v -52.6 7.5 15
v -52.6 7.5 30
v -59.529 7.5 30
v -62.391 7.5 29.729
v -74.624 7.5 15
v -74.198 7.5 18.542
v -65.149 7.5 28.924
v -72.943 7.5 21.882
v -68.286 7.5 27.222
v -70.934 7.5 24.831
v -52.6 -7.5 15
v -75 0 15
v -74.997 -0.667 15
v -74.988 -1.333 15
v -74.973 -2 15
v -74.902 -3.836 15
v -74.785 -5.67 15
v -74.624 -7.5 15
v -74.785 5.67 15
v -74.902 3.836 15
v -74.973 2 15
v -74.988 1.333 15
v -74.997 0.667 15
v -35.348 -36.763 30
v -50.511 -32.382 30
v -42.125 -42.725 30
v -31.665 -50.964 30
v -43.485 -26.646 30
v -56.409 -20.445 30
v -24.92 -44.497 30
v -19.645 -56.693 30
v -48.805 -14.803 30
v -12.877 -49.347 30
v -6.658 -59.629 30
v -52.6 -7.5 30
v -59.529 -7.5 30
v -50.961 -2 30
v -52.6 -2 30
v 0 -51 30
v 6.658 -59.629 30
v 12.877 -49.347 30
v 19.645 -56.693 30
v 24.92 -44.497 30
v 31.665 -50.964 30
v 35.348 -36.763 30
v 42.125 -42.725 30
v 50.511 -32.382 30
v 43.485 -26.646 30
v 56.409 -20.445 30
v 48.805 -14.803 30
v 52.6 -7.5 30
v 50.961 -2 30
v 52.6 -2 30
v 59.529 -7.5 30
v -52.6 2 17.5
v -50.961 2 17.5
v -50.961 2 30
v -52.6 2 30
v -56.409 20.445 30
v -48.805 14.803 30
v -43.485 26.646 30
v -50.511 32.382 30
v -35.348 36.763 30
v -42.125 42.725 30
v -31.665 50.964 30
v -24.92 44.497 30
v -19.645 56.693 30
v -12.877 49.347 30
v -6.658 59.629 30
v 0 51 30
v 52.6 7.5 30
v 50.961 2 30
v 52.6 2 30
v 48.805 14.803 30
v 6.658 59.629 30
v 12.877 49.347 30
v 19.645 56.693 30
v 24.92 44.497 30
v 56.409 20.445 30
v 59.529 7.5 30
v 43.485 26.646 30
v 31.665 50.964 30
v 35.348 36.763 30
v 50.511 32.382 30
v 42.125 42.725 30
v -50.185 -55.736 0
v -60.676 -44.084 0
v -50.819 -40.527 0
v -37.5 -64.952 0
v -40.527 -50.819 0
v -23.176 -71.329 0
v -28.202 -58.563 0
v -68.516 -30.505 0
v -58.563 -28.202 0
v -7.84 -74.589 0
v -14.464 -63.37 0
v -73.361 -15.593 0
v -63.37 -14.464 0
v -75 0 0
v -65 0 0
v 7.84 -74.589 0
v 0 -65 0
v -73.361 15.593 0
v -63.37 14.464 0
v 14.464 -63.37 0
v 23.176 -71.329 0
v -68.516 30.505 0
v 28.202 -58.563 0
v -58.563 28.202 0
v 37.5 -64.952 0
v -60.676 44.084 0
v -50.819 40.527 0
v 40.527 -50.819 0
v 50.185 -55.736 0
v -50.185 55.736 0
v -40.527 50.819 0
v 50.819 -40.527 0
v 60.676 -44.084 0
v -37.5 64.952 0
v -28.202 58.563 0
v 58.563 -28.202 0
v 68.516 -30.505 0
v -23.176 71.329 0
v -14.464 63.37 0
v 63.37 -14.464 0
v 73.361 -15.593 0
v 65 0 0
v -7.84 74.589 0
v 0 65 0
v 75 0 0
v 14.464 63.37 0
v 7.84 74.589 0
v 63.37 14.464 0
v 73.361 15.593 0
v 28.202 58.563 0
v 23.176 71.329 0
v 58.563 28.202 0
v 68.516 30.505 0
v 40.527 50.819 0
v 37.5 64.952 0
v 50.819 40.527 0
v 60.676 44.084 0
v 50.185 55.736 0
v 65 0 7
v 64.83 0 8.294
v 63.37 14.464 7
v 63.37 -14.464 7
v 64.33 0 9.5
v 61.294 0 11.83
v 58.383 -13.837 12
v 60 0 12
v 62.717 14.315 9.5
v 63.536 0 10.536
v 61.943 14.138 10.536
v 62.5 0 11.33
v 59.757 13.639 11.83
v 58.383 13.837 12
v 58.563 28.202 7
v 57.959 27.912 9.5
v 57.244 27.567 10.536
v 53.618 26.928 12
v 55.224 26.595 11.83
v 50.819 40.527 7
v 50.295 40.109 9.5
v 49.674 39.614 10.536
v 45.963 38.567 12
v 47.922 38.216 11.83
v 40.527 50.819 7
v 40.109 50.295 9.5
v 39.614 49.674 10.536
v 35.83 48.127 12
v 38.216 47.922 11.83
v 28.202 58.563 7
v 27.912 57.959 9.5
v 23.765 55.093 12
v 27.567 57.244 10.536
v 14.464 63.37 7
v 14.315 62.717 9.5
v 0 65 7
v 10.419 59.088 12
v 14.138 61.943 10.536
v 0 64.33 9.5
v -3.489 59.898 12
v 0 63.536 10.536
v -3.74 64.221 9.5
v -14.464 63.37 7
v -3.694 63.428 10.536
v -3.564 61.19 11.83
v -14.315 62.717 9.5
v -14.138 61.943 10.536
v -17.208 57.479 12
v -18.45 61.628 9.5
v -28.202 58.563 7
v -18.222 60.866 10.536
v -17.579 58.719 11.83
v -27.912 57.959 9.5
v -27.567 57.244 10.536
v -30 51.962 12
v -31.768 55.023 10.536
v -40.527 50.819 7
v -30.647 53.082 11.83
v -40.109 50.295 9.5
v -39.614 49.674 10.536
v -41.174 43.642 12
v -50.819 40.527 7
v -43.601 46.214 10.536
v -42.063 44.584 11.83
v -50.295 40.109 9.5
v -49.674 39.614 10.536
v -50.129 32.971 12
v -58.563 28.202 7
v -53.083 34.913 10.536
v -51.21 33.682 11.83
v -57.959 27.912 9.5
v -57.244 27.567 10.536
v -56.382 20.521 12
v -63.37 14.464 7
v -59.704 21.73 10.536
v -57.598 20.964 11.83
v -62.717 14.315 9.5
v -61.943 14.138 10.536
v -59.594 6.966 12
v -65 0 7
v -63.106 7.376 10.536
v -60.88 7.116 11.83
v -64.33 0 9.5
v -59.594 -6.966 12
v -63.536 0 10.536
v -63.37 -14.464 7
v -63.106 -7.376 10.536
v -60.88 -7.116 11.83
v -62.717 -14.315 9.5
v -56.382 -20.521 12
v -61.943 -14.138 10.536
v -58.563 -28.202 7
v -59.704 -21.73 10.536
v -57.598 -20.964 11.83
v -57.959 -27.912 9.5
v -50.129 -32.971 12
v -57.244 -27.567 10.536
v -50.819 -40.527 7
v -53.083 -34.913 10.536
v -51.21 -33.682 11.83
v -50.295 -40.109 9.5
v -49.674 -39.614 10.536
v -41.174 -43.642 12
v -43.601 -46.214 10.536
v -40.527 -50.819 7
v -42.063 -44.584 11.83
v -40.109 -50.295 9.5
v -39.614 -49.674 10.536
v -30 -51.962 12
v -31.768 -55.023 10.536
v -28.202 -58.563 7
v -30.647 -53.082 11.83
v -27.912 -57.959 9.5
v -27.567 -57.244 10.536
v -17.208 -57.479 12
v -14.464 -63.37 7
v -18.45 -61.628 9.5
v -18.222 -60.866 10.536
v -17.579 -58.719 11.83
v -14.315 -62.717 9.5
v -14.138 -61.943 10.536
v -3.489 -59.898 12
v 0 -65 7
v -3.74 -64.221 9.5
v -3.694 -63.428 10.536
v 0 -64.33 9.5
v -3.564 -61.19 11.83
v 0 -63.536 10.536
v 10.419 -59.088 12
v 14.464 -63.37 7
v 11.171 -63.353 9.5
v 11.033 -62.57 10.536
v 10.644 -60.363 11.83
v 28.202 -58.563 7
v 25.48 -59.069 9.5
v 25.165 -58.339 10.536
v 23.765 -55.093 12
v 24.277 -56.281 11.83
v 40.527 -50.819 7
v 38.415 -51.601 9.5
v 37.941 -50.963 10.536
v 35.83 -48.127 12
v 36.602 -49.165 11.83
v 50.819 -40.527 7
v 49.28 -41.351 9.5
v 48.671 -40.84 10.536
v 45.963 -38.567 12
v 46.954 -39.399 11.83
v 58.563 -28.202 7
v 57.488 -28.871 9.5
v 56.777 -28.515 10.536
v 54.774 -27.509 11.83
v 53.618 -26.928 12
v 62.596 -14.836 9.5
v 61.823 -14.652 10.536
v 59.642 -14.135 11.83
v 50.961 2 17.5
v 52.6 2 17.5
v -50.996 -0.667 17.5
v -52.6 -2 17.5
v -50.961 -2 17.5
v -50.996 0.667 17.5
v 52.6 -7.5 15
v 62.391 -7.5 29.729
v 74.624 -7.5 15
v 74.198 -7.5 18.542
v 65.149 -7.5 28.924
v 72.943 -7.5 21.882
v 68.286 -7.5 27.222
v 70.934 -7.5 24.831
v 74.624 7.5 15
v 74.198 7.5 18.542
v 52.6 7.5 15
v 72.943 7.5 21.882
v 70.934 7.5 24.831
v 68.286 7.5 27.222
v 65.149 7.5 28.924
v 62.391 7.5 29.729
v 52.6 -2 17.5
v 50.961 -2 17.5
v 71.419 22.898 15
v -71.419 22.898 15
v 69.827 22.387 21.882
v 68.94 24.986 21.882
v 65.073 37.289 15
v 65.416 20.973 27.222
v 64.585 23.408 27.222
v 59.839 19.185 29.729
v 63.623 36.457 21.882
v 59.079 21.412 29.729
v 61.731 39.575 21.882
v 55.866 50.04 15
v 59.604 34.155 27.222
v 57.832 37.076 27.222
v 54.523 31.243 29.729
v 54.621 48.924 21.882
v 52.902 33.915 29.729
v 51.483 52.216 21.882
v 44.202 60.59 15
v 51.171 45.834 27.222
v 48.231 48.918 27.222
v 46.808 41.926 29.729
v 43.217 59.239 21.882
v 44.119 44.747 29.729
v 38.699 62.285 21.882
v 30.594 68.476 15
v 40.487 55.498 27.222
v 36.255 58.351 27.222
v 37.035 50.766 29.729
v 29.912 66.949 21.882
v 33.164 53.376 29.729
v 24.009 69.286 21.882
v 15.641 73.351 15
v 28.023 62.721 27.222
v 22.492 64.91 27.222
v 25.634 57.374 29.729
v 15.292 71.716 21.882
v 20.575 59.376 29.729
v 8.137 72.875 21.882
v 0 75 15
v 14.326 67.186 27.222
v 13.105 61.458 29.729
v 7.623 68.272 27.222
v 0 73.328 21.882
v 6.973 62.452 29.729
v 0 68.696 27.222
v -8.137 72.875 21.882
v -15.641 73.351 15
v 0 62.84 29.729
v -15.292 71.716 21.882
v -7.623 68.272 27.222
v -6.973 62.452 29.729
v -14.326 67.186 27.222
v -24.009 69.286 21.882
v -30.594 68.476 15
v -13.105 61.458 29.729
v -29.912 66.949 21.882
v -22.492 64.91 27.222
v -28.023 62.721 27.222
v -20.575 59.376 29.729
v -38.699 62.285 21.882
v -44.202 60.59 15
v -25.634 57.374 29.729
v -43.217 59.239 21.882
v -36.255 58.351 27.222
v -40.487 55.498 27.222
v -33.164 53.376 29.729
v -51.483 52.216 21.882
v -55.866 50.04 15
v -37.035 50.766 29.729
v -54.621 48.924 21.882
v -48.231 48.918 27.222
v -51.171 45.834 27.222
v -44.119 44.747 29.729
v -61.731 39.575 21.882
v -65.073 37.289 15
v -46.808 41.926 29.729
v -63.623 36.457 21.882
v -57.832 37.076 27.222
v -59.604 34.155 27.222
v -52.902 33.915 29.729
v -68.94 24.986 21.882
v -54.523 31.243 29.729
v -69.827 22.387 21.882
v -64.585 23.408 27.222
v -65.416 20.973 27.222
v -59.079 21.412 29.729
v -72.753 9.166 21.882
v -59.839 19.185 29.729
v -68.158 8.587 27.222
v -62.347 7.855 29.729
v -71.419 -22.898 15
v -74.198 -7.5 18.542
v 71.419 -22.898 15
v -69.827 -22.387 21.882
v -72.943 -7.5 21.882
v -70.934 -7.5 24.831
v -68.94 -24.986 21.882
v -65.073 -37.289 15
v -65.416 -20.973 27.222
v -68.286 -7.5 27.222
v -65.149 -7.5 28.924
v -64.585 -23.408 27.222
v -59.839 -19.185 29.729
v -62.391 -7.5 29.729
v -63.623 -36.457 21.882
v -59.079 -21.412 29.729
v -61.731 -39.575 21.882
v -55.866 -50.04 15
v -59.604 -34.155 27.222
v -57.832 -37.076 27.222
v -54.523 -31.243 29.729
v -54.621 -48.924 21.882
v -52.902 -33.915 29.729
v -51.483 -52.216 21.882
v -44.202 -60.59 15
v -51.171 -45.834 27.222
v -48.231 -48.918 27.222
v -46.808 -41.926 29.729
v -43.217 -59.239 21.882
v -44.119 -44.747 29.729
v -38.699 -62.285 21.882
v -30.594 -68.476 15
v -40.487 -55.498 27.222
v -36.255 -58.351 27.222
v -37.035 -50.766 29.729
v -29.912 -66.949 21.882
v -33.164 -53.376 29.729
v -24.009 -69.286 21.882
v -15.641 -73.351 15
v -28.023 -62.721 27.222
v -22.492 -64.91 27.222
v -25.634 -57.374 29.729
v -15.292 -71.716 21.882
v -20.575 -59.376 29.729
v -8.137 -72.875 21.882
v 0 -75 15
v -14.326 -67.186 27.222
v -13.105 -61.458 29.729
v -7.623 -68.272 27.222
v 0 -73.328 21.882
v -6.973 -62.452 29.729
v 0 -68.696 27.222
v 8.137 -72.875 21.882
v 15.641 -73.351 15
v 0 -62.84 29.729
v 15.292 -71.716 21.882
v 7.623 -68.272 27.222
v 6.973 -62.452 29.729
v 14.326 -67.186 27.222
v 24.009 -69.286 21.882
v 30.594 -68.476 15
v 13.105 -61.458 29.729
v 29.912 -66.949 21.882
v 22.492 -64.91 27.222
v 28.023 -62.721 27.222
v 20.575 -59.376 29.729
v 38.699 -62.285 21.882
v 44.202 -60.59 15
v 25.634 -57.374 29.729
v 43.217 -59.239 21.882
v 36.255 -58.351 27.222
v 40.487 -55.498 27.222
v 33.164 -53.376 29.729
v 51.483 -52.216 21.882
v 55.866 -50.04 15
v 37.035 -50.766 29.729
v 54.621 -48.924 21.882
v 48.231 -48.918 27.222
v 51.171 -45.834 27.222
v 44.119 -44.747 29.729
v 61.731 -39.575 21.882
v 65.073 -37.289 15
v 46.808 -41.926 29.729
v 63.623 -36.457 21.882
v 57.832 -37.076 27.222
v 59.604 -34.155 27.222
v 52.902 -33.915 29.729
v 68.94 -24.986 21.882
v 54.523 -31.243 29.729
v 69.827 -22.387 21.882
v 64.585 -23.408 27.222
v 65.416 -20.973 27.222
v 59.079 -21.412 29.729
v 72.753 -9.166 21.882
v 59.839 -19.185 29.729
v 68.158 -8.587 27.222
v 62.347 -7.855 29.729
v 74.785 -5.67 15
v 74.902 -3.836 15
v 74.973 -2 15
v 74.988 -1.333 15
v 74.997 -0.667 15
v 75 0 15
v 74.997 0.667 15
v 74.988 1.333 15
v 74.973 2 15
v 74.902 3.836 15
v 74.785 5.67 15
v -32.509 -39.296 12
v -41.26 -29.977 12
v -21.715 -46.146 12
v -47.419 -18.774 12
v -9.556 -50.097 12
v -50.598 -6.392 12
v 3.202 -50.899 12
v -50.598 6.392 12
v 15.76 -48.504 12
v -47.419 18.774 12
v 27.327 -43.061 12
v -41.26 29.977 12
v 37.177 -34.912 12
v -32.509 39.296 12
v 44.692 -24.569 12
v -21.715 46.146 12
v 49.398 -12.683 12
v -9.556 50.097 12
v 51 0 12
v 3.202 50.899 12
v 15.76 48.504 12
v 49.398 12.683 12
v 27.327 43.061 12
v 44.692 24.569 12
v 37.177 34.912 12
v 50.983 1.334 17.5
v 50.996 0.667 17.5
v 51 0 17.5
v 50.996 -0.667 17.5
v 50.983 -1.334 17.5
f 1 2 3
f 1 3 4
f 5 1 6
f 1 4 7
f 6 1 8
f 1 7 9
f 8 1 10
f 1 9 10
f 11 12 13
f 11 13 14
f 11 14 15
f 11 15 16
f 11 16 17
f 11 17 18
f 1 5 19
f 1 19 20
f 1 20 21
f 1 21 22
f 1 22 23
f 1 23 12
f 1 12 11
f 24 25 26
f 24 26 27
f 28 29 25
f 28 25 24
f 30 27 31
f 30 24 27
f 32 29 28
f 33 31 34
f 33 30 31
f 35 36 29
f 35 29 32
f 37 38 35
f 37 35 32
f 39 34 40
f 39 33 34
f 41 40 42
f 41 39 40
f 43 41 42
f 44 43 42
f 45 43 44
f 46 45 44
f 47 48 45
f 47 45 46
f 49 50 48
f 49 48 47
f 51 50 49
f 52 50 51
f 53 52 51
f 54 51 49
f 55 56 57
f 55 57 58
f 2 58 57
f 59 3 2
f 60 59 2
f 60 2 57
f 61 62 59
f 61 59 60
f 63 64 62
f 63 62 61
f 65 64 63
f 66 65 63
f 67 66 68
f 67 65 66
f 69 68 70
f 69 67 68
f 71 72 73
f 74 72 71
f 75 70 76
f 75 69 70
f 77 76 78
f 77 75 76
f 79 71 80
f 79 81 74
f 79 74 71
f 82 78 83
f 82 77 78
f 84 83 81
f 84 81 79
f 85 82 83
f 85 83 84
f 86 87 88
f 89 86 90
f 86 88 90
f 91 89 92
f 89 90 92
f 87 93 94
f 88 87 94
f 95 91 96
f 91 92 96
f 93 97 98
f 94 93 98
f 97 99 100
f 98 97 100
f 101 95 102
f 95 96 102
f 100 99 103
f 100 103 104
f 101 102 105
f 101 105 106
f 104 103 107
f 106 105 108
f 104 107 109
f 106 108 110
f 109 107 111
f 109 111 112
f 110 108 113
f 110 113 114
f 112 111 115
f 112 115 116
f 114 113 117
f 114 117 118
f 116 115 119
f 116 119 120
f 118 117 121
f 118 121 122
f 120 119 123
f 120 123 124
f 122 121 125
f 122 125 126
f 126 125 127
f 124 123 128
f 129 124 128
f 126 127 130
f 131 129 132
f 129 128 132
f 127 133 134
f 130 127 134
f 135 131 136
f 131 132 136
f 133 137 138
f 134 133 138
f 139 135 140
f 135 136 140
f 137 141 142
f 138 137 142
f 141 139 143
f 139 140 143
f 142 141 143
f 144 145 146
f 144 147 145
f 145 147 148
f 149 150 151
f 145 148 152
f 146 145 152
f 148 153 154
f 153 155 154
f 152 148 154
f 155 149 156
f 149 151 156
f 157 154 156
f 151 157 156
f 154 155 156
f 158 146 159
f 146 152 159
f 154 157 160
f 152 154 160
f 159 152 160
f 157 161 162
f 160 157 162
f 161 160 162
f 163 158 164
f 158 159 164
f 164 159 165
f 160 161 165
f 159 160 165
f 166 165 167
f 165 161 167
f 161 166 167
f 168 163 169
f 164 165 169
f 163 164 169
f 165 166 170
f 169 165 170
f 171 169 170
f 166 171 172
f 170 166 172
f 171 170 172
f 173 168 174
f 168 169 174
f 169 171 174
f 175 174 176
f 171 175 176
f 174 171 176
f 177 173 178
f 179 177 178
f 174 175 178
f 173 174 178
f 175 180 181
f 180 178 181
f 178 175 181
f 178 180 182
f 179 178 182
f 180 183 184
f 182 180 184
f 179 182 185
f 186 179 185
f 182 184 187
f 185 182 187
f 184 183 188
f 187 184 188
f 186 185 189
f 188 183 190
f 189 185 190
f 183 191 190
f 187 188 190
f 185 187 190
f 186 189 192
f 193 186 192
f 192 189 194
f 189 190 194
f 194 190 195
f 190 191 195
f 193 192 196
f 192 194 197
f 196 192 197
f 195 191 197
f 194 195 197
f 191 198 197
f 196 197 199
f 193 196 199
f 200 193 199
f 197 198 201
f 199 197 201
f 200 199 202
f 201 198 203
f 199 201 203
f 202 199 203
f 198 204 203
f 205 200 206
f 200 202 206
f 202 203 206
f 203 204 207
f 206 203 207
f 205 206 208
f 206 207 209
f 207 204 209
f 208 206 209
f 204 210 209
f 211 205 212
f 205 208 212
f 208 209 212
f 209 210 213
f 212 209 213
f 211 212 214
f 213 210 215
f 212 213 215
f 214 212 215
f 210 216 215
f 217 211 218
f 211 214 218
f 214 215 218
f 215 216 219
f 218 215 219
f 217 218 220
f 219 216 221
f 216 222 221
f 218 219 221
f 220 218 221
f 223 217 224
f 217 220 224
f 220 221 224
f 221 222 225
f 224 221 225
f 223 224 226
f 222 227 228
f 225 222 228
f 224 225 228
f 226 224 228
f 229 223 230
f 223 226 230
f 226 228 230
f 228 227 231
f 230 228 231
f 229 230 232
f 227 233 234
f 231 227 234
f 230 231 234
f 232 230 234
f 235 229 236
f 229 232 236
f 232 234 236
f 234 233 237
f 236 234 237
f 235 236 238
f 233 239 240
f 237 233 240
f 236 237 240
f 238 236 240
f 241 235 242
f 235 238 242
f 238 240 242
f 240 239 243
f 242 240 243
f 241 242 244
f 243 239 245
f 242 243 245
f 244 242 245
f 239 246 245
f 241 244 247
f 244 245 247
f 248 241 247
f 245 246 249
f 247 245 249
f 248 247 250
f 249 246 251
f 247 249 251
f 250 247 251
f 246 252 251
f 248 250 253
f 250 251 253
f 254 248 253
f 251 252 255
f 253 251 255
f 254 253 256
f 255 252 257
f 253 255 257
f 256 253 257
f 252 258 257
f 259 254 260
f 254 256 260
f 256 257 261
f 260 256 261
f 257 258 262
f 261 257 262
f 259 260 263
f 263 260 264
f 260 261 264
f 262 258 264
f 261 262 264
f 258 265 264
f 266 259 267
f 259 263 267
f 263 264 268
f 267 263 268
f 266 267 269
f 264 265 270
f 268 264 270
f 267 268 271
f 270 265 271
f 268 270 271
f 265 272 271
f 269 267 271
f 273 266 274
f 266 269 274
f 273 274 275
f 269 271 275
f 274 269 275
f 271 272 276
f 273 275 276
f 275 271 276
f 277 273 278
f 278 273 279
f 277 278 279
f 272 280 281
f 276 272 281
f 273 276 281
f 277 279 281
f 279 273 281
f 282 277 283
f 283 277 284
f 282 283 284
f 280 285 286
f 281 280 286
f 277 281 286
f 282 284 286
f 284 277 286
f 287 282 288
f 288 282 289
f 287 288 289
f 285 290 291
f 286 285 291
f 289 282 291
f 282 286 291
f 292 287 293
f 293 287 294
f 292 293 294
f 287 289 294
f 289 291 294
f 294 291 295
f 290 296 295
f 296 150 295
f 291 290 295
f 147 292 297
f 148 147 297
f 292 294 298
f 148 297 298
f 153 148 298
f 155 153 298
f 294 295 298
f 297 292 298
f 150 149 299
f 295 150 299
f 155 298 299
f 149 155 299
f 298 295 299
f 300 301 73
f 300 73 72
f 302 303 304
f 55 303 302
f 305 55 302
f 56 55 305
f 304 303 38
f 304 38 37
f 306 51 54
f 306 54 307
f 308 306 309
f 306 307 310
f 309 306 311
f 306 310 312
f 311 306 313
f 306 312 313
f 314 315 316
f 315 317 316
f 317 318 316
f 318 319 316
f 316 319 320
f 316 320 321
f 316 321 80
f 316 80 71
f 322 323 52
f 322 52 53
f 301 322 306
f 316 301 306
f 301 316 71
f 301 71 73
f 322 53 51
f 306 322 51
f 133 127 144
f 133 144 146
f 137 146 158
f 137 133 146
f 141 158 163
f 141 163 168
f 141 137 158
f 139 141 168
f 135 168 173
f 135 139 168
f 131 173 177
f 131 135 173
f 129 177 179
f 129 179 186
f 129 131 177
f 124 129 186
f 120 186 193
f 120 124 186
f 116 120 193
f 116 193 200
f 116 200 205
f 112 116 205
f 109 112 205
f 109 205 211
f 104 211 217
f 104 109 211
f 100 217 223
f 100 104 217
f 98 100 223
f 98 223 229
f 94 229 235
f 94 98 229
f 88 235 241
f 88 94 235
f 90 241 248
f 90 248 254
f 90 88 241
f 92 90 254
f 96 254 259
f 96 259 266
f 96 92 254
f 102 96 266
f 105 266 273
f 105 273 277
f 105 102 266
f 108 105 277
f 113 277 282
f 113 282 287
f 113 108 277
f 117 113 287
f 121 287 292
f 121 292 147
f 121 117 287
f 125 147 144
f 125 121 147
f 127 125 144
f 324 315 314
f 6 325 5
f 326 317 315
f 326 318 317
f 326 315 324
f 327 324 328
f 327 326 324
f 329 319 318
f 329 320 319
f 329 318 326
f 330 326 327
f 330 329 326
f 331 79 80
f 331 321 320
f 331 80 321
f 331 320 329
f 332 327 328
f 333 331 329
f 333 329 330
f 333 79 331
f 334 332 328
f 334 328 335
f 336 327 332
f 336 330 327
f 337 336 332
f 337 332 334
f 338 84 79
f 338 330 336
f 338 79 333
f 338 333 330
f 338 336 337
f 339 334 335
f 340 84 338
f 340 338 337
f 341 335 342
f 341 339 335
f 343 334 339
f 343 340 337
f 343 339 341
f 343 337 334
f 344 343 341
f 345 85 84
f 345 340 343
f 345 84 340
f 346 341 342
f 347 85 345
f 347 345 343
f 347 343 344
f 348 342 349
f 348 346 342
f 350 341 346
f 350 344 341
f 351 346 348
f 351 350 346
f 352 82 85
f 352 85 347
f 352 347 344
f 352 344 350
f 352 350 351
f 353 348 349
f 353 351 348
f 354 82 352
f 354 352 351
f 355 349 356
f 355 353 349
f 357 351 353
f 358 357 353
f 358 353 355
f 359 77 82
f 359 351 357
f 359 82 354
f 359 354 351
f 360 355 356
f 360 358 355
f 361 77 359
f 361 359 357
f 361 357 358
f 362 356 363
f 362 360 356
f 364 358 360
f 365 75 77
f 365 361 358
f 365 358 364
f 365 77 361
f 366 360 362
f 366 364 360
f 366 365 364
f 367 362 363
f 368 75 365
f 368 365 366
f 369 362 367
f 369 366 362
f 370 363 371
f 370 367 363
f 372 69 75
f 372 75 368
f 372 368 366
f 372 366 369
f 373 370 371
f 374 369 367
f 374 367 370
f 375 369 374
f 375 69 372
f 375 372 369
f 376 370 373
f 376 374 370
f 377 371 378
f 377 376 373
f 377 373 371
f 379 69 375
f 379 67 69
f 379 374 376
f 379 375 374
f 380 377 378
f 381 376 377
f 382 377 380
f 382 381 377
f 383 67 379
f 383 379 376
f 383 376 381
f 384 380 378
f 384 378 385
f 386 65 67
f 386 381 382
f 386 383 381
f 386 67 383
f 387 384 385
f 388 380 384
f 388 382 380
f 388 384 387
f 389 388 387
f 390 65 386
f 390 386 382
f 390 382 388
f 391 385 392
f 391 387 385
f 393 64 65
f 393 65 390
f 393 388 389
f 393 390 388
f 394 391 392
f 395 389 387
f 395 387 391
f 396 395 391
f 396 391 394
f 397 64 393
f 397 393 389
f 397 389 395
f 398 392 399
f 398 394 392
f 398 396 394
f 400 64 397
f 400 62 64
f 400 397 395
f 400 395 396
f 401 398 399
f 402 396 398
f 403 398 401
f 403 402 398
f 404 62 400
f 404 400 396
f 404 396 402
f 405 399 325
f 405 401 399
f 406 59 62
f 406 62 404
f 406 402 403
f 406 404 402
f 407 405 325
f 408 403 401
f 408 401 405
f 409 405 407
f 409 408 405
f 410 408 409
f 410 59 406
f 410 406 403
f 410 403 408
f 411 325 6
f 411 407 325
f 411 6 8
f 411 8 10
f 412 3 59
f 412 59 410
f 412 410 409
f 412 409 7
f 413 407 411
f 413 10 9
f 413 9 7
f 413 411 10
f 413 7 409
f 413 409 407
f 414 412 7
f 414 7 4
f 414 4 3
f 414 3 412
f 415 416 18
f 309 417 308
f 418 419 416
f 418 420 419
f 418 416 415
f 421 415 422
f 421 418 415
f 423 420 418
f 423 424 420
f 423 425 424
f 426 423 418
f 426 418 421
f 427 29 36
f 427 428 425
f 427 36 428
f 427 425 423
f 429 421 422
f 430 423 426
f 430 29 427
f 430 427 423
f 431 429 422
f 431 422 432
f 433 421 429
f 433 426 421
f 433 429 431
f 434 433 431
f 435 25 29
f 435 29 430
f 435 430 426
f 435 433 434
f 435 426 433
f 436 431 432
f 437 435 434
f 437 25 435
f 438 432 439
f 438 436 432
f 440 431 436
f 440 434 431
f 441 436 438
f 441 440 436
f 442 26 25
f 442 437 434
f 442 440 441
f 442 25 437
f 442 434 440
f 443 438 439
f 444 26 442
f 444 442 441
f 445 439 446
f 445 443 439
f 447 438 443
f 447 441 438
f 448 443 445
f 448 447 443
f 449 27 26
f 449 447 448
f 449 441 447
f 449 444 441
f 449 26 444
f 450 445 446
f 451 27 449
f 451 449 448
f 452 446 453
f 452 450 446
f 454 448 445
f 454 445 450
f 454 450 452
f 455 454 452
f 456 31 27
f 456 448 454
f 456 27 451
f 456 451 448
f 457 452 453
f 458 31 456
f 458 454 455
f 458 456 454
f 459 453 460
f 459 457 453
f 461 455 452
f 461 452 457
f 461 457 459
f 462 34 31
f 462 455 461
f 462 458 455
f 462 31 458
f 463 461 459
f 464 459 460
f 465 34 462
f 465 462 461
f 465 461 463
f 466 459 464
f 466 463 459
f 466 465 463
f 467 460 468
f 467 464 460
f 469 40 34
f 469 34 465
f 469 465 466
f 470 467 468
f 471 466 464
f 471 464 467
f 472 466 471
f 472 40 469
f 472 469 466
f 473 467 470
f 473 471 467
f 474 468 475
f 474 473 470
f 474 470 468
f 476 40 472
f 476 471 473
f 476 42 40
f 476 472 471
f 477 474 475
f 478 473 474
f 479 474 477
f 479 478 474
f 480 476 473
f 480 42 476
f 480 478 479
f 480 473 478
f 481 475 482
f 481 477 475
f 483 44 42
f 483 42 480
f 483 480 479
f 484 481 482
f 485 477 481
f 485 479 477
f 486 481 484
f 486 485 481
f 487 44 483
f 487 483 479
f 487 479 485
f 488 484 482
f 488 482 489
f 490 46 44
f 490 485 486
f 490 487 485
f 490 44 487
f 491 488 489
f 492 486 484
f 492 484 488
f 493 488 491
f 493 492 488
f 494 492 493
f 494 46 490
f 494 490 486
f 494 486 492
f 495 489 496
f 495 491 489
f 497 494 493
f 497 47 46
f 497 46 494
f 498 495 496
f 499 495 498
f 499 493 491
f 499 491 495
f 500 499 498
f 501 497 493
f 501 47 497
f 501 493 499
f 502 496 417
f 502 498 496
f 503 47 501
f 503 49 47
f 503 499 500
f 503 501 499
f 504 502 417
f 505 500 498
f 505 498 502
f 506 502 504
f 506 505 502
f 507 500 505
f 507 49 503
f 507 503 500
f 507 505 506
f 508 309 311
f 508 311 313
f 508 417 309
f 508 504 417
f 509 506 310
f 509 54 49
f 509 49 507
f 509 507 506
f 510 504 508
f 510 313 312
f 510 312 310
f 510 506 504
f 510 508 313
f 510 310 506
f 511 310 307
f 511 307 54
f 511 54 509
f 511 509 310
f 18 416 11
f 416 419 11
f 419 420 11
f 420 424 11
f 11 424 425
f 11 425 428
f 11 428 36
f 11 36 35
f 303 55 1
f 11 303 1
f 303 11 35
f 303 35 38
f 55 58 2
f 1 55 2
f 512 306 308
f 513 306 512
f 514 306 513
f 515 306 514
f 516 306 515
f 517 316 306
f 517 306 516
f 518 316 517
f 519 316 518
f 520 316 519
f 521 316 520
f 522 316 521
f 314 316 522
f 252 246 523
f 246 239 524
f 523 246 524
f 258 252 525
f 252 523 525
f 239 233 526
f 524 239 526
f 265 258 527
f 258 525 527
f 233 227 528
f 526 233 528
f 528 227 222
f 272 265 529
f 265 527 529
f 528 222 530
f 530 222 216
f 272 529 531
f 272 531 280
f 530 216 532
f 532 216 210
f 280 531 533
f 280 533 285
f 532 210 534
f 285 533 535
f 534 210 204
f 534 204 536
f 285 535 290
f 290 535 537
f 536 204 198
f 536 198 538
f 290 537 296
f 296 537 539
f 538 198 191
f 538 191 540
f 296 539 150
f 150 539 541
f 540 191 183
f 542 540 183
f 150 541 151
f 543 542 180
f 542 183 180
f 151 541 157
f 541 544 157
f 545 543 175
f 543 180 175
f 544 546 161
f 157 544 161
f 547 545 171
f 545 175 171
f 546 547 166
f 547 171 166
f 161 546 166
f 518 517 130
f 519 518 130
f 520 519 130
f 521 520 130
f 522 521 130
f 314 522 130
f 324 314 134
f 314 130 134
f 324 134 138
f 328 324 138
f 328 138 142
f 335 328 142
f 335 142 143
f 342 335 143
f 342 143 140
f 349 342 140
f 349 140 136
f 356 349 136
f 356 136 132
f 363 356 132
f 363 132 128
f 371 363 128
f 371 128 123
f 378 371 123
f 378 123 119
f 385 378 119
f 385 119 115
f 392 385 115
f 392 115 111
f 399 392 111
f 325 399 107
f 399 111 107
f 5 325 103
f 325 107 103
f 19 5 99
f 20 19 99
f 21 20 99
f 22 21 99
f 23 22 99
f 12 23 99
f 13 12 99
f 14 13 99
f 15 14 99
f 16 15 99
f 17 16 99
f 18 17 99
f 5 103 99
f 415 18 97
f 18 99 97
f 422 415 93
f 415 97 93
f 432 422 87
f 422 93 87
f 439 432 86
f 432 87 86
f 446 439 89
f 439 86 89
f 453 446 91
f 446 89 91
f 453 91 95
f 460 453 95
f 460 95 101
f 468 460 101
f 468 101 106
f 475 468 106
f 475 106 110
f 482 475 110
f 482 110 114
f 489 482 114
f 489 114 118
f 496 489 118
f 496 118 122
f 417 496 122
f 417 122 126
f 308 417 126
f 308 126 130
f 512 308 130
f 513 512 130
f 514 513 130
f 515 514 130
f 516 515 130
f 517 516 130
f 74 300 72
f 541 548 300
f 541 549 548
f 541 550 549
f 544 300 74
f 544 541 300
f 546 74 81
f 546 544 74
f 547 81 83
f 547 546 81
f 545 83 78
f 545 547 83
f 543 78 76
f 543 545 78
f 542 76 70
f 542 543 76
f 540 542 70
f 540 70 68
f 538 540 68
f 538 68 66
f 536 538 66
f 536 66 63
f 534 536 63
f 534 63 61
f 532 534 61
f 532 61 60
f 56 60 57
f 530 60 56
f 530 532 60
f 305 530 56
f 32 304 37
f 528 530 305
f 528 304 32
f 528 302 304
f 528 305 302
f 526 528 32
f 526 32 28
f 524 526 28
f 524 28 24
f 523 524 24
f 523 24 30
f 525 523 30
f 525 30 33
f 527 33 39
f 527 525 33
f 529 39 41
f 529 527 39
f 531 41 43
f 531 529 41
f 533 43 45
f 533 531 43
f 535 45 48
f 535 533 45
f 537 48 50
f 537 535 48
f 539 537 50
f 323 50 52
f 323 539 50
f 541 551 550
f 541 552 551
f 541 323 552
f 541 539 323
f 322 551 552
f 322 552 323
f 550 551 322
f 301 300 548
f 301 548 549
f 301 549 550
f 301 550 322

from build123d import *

# Parameters (mm, degrees)
F0_R     = 75
F0_R_2   = 65
F0_R_3   = 51
F1_DEPTH = 30
F3_DEPTH = 12
F4_R     = 5
F5_R     = 15
F6_DEPTH = 15
F7_DEPTH = 12.5


with BuildPart() as f1:
    # F0 (on Top) → F1 (new body)
    with BuildSketch(Plane.XY):
        Circle(F0_R)
        Circle(F0_R_2, mode=Mode.SUBTRACT)
        Circle(F0_R_2)
        Circle(F0_R_3, mode=Mode.SUBTRACT)
    extrude(amount=F1_DEPTH)

    # F0 (on Top) → F3 (cut)
    with BuildSketch(Plane.XY):
        Circle(F0_R_2)
        Circle(F0_R_3, mode=Mode.SUBTRACT)
    extrude(amount=F3_DEPTH, mode=Mode.SUBTRACT)

    # F4
    f4_edges = [f1.edges().sort_by_distance(p)[0] for p in [
        (-65, 0, 12),
    ]]
    fillet(f4_edges, radius=F4_R)

    # F5
    f5_edges = [f1.edges().sort_by_distance(p)[0] for p in [
        (-75, 0, 30),
    ]]
    fillet(f5_edges, radius=F5_R)

    # F2 (on face) → F6 (cut)
    with BuildSketch(Plane.XY.offset(30)):
        with BuildLine():
            Line((52.6, -2), (74.9733285909, -2))
            ThreePointArc((74.9733285909, -2), (74.9933318513, -1.0000889166), (75, 0))
            ThreePointArc((75, 0), (74.9933318513, 1.0000889166), (74.9733285909, 2))
            Line((74.9733285909, 2), (52.6, 2))
            Line((52.6, 2), (52.6, -2))
        make_face()
        with BuildLine():
            Line((52.6, 2), (74.9733285909, 2))
            ThreePointArc((74.9733285909, 2), (74.8492284695, 4.7532091816), (74.624057783, 7.5))
            Line((74.624057783, 7.5), (52.6, 7.5))
            Line((52.6, 7.5), (52.6, 2))
        make_face()
        with BuildLine():
            ThreePointArc((74.624057783, -7.5), (74.8492284695, -4.7532091816), (74.9733285909, -2))
            Line((74.9733285909, -2), (52.6, -2))
            Line((52.6, -2), (52.6, -7.5))
            Line((52.6, -7.5), (74.624057783, -7.5))
        make_face()
        with BuildLine():
            Line((-52.6, 7.5), (-74.624057783, 7.5))
            ThreePointArc((-74.624057783, 7.5), (-74.8492284695, 4.7532091816), (-74.9733285909, 2))
            Line((-74.9733285909, 2), (-52.6, 2))
            Line((-52.6, 2), (-52.6, 7.5))
        make_face()
        with BuildLine():
            ThreePointArc((-75, 0), (-74.9933318513, -1.0000889166), (-74.9733285909, -2))
            Line((-74.9733285909, -2), (-52.6, -2))
            Line((-52.6, -2), (-52.6, 2))
            Line((-52.6, 2), (-74.9733285909, 2))
            ThreePointArc((-74.9733285909, 2), (-74.9933318513, 1.0000889166), (-75, 0))
        make_face()
        with BuildLine():
            ThreePointArc((-74.9733285909, -2), (-74.8492284695, -4.7532091816), (-74.624057783, -7.5))
            Line((-74.624057783, -7.5), (-52.6, -7.5))
            Line((-52.6, -7.5), (-52.6, -2))
            Line((-52.6, -2), (-74.9733285909, -2))
        make_face()
    extrude(amount=-F6_DEPTH, mode=Mode.SUBTRACT)

    # F2 (on face) → F7 (cut)
    with BuildSketch(Plane.XY.offset(30)):
        with BuildLine():
            Line((-52.6, -2), (-50.960769225, -2))
            ThreePointArc((-50.960769225, -2), (-51, 0), (-50.960769225, 2))
            Line((-50.960769225, 2), (-52.6, 2))
            Line((-52.6, 2), (-52.6, -2))
        make_face()
        with BuildLine():
            Line((50.960769225, -2), (52.6, -2))
            Line((52.6, -2), (52.6, 2))
            Line((52.6, 2), (50.960769225, 2))
            ThreePointArc((50.960769225, 2), (50.990191363, 1.0001923632), (51, 0))
            ThreePointArc((51, 0), (50.990191363, -1.0001923632), (50.960769225, -2))
        make_face()
    extrude(amount=-F7_DEPTH, mode=Mode.SUBTRACT)


solid = f1.part
